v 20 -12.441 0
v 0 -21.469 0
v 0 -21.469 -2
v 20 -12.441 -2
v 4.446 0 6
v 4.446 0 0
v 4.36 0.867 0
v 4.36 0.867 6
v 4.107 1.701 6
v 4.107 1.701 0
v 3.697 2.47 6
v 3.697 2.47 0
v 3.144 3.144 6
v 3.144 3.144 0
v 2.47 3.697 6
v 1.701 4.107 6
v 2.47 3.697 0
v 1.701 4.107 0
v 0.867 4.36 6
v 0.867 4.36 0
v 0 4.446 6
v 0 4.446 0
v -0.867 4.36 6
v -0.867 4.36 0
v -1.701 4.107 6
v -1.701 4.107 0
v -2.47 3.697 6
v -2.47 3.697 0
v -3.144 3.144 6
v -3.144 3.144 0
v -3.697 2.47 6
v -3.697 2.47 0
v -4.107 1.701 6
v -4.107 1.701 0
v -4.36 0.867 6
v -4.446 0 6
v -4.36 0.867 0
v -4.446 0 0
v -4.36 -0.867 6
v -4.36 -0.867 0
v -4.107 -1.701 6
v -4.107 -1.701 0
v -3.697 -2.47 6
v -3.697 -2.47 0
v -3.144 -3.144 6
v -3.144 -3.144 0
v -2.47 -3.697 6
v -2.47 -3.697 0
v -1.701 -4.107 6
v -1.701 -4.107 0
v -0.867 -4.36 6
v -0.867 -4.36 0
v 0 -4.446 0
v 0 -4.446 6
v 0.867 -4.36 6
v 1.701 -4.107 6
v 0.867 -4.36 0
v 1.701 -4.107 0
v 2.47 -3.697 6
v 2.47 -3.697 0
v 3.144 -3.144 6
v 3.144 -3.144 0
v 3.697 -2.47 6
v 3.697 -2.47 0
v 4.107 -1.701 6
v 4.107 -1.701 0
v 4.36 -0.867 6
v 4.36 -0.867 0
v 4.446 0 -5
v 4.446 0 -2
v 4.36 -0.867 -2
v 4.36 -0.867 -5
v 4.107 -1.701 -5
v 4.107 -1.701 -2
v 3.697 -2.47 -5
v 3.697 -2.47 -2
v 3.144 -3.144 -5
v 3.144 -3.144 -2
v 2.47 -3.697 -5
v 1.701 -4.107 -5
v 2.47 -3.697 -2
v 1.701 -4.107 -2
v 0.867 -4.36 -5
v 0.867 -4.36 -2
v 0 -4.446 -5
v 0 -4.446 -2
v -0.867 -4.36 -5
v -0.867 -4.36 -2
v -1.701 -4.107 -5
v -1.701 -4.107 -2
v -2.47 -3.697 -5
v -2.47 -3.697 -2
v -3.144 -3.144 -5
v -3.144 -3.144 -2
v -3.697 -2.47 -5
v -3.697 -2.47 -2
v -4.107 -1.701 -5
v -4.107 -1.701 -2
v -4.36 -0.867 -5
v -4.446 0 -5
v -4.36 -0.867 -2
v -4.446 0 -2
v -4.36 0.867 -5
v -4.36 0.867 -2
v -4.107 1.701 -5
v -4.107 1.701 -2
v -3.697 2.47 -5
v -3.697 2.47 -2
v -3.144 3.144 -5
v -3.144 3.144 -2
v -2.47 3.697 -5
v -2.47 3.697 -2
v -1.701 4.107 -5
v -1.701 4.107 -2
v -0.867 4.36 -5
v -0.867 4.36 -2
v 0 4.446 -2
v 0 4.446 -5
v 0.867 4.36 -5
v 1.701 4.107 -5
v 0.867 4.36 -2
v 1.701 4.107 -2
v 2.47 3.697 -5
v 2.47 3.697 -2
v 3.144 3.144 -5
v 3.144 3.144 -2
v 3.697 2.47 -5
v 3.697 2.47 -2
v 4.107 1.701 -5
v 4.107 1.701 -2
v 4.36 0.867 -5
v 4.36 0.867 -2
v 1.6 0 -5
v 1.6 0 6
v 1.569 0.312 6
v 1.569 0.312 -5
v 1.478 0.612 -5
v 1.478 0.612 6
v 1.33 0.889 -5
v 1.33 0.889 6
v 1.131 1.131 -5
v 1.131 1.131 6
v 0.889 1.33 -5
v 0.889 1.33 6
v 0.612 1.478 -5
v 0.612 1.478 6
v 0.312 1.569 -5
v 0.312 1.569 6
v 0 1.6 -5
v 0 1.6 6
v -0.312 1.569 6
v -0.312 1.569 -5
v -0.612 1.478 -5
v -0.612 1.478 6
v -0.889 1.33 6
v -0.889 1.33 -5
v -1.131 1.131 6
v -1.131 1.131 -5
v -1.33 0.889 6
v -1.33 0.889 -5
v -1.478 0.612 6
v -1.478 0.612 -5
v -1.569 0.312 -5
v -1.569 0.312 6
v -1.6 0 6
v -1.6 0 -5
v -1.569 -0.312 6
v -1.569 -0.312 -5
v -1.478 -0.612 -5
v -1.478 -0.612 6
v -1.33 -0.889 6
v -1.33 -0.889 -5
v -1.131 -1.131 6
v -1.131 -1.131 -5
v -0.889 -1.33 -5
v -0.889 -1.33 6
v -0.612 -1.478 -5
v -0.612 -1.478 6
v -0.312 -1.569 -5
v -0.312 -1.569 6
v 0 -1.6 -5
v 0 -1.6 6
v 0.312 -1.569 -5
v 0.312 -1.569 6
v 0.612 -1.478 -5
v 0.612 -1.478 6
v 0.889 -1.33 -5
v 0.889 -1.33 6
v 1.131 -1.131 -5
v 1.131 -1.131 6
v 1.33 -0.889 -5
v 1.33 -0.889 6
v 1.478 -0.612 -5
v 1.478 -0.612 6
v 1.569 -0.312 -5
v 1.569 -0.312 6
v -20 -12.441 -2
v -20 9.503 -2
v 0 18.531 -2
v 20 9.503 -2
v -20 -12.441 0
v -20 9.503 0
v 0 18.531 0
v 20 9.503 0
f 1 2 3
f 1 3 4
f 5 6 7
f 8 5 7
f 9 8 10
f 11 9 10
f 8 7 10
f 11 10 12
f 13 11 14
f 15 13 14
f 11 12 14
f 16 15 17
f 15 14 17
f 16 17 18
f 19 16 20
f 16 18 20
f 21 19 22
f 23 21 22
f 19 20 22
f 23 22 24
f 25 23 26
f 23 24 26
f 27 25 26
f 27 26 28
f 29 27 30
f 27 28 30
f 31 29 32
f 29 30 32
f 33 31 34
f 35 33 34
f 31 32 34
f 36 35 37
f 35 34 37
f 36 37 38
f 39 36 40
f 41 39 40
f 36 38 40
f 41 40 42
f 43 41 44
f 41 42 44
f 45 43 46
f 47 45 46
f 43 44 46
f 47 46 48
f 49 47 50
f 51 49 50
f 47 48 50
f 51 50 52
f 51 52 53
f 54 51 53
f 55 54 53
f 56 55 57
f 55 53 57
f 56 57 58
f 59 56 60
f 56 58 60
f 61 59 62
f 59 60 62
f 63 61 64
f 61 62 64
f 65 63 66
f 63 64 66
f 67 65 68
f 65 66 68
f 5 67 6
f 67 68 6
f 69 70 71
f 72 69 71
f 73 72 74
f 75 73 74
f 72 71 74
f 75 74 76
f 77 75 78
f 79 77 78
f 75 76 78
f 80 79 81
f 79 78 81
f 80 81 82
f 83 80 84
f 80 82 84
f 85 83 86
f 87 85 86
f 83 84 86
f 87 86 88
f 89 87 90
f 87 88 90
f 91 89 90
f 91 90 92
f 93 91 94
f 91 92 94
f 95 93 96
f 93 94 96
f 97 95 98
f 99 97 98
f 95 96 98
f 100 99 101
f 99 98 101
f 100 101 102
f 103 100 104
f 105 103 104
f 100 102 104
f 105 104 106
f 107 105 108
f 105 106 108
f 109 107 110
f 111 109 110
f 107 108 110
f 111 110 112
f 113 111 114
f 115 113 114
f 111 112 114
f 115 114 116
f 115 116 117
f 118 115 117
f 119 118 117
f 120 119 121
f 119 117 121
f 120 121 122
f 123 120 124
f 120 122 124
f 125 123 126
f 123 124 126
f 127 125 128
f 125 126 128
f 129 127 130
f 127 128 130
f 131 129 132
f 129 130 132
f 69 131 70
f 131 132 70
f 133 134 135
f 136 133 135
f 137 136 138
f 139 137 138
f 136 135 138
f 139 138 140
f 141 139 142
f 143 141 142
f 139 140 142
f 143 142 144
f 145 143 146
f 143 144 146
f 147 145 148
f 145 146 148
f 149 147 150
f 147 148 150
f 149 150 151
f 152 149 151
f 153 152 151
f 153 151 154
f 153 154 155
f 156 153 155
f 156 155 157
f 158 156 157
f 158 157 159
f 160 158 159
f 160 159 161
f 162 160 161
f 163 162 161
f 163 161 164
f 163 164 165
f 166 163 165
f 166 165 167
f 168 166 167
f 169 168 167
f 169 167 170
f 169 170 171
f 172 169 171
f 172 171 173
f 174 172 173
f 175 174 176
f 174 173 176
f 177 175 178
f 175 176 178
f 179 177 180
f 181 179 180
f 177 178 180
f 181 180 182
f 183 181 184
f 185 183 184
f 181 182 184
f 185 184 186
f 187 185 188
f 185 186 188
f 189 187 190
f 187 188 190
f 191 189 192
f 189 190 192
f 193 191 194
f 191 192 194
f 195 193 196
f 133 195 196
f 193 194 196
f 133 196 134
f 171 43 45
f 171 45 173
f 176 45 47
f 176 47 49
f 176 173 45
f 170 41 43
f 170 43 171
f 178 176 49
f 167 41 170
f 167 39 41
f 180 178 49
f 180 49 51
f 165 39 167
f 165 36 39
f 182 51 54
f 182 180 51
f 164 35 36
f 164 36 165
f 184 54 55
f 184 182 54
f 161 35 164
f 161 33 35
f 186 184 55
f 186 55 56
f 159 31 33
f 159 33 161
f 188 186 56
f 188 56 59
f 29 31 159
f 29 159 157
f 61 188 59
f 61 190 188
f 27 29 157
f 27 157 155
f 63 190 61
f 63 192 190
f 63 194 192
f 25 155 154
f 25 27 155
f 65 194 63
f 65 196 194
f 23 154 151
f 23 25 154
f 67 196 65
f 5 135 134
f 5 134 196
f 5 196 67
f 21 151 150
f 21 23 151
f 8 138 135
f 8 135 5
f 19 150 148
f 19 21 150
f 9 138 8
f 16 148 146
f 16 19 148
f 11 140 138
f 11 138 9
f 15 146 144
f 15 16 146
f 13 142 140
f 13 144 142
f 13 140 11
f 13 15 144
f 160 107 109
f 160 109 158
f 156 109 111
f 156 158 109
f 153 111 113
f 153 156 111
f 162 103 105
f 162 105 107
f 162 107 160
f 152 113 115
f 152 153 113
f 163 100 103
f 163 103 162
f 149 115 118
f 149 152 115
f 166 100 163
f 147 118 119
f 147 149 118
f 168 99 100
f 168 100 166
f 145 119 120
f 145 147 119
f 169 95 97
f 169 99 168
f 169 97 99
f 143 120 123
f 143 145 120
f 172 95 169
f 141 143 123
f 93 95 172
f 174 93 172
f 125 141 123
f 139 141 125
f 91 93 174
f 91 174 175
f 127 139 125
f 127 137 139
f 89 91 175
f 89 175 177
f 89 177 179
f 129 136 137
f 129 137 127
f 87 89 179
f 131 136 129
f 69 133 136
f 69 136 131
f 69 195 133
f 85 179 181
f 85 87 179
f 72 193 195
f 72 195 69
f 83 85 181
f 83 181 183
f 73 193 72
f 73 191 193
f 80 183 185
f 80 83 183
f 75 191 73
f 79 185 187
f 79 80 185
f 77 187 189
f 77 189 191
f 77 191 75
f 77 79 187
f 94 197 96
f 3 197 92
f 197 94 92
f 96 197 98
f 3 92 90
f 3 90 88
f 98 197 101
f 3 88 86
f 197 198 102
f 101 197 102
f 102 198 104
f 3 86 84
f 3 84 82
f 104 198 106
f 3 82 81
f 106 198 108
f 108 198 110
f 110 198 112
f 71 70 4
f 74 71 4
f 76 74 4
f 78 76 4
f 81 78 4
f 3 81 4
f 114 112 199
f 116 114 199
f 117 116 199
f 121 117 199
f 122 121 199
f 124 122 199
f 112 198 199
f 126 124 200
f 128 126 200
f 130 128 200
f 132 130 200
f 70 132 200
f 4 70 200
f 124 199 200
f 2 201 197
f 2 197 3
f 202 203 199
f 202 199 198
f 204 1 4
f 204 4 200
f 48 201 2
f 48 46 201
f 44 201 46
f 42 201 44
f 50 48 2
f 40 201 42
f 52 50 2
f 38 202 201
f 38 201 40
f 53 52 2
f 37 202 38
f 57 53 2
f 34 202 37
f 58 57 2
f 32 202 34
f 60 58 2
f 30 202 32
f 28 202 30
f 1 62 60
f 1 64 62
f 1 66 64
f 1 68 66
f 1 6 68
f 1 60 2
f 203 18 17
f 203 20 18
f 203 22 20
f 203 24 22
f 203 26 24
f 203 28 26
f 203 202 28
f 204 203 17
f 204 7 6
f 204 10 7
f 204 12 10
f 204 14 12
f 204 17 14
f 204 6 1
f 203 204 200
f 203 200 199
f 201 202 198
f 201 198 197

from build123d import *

# Parameters (mm, degrees)
F1_DEPTH = 2
F2_R     = 4.445875
F3_DEPTH = 6
F4_R     = 4.445875
F5_DEPTH = 3
F6_R     = 1.6
F7_DEPTH = 11.001


with BuildPart() as f1:
    # F0 (on Top) → F1 (new body)
    with BuildSketch(Plane.XY):
        Polygon((20, 9.5026303193), (0, 18.5309549122), (-20, 9.5026303193), (-20, -12.4407204949), (0, -21.4690450878), (20, -12.4407204949), align=None)
    extrude(amount=-F1_DEPTH)

    # F2 (on face) → F3 (join)
    with BuildSketch(Plane.XY):
        Circle(F2_R)
    extrude(amount=F3_DEPTH)

    # F4 (on face) → F5 (join)
    with BuildSketch(Plane(origin=(0, 0, -2), x_dir=(1, 0, 0), z_dir=(0, 0, -1))):
        Circle(F4_R)
    extrude(amount=F5_DEPTH)

    # F6 (on face) → F7 (cut, through all)
    with BuildSketch(Plane.XY.offset(6)):
        Circle(F6_R)
    extrude(amount=-F7_DEPTH, mode=Mode.SUBTRACT)


solid = f1.part
